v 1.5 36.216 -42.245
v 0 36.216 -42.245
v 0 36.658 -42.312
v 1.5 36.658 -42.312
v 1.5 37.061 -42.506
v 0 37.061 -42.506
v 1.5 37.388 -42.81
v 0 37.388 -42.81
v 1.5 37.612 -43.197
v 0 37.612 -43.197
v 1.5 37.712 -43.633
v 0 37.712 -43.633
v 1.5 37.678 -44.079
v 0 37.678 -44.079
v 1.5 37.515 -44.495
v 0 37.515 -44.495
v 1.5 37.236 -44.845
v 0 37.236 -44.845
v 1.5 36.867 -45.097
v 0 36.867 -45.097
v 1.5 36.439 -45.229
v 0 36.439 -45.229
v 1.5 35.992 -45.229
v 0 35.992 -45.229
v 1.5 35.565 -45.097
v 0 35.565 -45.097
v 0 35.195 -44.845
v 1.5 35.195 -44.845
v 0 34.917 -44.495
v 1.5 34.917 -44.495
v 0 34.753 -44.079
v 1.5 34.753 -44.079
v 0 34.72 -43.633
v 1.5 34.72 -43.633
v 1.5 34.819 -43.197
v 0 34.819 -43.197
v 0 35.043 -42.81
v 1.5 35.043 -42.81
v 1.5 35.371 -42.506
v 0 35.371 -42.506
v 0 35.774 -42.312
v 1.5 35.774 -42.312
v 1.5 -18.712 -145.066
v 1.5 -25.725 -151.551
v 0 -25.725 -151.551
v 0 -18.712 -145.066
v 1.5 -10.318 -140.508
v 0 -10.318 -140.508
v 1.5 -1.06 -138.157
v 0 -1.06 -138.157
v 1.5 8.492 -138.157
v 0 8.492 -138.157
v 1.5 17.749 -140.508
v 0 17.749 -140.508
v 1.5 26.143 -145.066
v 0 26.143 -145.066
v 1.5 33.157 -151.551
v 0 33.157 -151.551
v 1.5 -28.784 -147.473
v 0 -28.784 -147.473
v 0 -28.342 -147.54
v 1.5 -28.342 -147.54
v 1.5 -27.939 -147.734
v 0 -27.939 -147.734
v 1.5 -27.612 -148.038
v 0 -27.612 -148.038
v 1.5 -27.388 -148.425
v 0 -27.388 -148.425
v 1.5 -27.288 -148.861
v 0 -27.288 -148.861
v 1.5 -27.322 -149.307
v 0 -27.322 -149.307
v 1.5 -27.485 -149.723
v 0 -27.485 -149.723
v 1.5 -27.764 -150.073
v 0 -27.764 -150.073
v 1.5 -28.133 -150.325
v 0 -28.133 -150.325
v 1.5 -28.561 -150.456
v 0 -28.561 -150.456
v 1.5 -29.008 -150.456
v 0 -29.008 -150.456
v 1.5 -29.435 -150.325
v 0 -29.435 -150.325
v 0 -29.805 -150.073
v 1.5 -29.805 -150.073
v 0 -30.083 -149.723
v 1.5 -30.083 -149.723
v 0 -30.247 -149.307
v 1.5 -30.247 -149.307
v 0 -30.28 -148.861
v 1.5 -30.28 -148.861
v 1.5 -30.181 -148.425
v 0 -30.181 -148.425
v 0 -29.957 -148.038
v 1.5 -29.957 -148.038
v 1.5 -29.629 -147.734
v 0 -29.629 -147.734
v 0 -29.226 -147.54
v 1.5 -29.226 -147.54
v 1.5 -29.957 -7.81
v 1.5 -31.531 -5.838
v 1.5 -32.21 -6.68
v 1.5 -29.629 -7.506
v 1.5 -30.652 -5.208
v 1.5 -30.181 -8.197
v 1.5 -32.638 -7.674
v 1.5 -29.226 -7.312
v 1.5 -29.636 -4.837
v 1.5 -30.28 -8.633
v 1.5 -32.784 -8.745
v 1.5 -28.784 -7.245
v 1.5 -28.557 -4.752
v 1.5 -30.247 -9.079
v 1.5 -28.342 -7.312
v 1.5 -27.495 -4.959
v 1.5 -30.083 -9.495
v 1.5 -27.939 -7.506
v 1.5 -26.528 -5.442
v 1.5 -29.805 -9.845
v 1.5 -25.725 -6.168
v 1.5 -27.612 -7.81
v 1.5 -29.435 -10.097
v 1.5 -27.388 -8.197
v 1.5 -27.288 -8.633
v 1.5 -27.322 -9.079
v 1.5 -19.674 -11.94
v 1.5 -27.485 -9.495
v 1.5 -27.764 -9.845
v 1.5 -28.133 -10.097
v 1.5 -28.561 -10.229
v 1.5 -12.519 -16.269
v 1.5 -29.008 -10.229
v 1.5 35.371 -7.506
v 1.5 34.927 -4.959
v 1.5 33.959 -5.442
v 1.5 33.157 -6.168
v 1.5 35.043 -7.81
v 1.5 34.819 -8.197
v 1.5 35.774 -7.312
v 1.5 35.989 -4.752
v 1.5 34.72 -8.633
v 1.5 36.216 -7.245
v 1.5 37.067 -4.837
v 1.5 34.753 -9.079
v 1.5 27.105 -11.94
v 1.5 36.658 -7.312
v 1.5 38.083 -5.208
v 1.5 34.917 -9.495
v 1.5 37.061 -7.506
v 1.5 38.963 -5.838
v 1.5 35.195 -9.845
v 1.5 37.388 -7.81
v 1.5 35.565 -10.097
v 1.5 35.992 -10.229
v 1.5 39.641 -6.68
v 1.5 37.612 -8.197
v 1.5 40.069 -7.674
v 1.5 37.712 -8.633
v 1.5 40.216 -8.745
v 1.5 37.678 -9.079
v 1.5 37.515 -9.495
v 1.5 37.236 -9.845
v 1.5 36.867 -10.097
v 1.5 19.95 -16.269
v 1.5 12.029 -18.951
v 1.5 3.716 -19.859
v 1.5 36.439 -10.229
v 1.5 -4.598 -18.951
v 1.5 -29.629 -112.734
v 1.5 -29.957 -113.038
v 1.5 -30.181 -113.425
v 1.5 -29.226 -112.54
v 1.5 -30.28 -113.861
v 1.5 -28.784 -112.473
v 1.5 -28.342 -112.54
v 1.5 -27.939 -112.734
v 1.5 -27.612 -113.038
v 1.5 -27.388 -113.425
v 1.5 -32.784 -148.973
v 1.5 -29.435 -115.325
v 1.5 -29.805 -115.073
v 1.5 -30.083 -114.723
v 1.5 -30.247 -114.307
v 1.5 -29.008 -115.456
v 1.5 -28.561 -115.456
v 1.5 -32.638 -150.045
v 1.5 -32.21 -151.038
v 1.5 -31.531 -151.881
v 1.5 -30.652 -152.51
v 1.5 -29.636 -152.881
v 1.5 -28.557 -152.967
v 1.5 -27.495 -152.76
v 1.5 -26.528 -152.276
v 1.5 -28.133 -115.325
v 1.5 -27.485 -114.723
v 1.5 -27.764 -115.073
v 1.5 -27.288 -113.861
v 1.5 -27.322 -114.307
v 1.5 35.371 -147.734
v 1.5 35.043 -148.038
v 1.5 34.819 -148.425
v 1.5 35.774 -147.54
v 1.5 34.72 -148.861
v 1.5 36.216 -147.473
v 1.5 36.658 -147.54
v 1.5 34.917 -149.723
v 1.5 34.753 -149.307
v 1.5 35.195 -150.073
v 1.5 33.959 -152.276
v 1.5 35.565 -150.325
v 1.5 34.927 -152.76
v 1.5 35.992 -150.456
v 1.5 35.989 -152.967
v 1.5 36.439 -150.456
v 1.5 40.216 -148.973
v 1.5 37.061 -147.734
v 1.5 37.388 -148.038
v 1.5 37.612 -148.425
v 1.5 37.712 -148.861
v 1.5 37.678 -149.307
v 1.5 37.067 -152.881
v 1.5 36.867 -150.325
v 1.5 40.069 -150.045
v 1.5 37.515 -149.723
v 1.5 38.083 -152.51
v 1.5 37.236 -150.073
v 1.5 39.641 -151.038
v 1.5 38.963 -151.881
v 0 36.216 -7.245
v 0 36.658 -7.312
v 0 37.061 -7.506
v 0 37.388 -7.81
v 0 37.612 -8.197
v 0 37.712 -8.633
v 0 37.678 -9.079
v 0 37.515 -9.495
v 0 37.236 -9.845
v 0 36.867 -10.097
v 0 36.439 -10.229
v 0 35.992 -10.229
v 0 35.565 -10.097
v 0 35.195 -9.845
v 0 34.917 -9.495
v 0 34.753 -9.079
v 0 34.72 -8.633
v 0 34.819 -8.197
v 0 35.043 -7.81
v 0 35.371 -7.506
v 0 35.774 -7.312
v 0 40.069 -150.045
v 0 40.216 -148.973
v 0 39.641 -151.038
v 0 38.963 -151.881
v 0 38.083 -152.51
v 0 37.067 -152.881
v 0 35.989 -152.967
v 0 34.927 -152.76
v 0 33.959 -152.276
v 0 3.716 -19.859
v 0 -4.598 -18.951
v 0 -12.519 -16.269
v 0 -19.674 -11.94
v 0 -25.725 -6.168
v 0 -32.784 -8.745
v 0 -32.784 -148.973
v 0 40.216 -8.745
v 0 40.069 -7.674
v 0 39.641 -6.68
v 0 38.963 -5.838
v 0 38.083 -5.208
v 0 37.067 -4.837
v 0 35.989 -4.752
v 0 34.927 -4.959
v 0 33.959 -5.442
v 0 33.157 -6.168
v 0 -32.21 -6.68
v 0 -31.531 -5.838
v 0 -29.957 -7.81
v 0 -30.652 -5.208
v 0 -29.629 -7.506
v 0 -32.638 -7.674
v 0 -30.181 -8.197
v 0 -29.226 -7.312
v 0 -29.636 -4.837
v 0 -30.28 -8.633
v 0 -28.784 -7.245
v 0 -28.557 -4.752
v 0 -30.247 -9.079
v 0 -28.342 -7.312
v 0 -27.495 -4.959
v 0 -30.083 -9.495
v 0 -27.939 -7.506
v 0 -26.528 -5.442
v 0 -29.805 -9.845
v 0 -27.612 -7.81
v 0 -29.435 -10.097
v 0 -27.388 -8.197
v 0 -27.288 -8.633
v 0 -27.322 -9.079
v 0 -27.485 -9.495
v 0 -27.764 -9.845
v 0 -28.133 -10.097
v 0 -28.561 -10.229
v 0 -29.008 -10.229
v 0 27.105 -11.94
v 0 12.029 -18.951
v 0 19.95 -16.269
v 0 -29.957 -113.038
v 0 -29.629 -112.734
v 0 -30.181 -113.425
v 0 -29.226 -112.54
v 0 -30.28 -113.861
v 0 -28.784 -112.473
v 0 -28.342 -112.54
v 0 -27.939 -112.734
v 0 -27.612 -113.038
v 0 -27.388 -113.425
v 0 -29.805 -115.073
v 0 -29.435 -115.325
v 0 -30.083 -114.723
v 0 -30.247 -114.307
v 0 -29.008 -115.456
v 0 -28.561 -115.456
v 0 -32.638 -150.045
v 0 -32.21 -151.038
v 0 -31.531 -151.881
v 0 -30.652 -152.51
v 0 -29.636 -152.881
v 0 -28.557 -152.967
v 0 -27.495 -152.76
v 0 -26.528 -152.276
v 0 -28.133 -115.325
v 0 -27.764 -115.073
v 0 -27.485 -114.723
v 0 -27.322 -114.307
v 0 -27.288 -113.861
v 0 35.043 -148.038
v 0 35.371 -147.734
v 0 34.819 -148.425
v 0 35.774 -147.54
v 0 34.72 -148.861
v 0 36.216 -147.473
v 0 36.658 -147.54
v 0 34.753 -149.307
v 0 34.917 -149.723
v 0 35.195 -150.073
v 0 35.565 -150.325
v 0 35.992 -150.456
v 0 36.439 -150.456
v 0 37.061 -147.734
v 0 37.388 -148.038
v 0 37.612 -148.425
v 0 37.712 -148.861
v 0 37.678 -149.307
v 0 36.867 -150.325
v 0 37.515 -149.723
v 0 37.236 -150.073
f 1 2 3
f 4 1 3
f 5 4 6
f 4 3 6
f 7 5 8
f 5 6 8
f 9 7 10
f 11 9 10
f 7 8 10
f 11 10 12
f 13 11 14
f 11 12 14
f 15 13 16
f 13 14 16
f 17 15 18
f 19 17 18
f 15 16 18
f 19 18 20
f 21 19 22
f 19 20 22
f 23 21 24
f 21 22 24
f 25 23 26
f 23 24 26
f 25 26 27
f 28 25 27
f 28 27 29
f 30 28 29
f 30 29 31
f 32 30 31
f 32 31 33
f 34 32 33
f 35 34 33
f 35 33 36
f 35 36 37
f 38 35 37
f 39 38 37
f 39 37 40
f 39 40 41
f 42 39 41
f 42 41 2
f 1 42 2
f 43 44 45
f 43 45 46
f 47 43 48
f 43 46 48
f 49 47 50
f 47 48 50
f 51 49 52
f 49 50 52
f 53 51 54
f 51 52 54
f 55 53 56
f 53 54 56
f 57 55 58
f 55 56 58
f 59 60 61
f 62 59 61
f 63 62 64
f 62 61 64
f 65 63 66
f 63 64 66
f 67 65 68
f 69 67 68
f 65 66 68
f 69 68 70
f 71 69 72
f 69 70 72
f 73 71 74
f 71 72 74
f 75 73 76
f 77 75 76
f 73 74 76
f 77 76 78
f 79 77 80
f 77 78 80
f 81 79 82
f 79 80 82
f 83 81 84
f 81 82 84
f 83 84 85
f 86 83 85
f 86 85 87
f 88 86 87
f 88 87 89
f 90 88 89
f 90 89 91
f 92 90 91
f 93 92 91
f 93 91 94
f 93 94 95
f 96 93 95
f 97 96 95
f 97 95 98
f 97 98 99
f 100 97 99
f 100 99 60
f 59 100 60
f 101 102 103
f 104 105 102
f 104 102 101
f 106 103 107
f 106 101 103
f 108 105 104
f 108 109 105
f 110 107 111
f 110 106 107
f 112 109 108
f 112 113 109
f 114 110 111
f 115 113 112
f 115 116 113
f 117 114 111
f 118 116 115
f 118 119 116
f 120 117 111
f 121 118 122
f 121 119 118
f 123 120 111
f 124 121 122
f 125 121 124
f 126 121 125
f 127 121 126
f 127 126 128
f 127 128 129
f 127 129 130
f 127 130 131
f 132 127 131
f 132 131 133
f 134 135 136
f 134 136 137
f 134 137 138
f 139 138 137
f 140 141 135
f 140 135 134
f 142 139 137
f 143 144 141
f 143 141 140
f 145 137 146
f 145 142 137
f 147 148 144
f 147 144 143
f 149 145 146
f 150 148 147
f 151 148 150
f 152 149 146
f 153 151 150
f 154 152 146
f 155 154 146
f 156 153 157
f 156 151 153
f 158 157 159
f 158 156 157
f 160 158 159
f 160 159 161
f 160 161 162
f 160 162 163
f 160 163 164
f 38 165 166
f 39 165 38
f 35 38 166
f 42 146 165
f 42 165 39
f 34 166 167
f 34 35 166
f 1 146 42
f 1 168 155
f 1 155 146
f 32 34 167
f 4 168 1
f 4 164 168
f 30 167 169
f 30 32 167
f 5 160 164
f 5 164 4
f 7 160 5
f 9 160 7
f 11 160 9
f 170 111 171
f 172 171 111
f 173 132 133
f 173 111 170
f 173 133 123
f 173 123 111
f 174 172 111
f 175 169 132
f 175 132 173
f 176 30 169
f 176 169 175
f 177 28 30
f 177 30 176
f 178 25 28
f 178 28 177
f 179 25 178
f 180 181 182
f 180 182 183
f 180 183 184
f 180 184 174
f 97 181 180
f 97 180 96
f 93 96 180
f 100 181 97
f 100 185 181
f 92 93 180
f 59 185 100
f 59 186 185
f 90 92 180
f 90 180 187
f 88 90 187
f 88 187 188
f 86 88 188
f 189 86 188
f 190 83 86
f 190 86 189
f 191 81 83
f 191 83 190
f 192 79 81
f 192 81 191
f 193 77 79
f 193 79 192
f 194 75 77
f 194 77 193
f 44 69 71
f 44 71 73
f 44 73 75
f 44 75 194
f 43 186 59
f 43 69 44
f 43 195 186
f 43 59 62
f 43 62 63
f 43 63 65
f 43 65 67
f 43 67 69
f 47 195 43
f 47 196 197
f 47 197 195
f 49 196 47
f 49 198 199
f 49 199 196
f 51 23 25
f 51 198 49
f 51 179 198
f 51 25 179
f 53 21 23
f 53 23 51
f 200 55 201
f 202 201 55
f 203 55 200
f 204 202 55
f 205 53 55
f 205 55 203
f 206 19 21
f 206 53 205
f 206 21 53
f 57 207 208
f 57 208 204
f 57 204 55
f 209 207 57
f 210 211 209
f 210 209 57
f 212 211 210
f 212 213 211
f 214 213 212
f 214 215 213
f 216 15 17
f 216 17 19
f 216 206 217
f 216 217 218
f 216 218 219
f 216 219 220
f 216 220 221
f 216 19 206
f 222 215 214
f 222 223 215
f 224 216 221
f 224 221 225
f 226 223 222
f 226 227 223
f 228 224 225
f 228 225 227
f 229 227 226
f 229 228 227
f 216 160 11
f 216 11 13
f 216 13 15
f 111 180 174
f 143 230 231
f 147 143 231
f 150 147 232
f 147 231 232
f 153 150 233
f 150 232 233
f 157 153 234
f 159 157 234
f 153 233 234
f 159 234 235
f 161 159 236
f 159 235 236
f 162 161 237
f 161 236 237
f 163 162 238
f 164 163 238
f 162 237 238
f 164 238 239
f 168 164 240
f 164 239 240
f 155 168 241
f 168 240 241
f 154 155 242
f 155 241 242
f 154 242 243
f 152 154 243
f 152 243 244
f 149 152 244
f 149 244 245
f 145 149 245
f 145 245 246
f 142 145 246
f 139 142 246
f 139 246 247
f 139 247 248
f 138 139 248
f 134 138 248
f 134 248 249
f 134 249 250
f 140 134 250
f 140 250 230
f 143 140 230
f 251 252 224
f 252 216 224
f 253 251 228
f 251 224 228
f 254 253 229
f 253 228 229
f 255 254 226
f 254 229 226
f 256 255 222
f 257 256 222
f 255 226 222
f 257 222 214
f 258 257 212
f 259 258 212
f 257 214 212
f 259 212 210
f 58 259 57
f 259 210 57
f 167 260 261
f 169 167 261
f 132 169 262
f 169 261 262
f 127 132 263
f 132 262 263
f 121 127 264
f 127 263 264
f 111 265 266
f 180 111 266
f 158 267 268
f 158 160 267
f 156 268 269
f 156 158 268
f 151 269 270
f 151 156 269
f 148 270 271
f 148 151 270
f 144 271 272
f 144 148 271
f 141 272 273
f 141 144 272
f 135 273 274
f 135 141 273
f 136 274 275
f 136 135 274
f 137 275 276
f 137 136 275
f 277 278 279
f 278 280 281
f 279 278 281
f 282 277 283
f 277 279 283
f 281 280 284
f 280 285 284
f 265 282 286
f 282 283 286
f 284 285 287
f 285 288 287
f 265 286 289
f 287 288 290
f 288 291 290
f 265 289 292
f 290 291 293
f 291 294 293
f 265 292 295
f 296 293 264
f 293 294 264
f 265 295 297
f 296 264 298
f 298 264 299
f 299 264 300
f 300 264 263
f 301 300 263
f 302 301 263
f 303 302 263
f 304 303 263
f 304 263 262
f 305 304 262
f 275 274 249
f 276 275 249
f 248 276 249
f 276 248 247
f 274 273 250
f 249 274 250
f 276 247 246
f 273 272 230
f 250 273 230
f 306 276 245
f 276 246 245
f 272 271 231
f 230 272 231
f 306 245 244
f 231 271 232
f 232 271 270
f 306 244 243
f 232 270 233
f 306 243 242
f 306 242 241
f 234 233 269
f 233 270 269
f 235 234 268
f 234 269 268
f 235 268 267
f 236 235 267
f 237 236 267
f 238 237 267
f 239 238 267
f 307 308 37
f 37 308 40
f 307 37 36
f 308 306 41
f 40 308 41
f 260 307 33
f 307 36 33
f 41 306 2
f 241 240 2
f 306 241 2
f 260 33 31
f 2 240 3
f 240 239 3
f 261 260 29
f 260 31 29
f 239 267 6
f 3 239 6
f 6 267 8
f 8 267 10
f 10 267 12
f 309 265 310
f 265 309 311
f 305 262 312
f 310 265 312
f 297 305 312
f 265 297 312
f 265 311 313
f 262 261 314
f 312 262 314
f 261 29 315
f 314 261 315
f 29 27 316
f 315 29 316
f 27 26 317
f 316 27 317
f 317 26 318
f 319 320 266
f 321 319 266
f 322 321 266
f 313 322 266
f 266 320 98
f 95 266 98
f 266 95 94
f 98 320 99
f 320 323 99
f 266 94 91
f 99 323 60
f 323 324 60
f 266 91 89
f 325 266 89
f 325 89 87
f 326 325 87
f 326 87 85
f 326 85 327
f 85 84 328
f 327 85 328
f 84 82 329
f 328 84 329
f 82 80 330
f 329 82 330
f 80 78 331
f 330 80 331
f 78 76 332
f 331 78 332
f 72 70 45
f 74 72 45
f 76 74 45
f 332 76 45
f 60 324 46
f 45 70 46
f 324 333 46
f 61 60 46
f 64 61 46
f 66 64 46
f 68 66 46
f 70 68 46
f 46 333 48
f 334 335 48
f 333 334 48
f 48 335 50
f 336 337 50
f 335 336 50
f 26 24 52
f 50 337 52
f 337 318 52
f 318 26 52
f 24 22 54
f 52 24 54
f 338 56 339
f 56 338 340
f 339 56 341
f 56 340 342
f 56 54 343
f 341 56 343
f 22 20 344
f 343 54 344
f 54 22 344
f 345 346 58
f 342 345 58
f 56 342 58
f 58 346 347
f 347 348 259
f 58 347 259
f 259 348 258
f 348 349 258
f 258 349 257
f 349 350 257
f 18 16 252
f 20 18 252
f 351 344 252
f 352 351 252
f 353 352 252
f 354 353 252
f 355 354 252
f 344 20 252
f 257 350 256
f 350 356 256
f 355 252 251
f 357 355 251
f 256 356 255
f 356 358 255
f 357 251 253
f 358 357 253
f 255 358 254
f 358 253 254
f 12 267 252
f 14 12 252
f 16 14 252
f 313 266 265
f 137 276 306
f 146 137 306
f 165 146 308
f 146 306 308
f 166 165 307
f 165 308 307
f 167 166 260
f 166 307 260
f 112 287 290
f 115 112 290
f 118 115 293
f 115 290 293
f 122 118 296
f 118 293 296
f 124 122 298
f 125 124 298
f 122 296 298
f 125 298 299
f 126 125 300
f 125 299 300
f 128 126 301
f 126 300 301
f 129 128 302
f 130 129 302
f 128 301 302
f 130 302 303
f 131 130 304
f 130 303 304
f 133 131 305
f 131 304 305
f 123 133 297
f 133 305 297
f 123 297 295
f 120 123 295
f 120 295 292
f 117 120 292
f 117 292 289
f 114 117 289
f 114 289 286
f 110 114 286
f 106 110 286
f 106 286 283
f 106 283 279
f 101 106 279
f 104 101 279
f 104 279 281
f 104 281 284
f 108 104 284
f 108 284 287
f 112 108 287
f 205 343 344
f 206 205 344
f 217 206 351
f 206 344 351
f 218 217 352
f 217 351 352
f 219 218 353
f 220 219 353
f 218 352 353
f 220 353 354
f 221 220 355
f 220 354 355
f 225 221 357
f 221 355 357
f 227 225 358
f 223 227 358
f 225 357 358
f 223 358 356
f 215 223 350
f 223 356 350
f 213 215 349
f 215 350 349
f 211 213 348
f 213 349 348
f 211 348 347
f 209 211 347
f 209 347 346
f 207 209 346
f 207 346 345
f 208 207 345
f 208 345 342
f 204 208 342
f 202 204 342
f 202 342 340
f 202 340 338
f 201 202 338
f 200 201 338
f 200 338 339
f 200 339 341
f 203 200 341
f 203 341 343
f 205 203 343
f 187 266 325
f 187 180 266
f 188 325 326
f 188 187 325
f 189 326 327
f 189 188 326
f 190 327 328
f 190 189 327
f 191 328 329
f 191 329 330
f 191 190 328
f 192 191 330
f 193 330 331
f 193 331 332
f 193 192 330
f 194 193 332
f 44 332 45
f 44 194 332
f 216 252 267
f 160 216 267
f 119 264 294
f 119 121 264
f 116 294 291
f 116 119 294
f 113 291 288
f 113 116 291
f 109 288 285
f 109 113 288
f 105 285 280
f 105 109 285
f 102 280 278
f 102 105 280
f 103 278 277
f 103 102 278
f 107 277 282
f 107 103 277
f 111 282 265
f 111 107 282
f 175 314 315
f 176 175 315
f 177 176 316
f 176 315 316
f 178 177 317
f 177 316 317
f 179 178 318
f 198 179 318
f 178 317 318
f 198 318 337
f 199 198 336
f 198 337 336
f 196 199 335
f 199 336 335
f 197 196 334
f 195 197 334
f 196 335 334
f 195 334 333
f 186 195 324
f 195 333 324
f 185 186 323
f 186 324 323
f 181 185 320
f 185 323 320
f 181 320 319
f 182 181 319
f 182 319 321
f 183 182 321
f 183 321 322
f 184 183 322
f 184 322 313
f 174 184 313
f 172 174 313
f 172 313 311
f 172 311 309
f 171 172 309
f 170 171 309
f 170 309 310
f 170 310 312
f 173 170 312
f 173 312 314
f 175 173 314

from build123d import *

# Parameters (mm, degrees)
BOSS_EXTRUDE1_DEPTH       = 1.5
FILLET1_R                 = 4
F_3_0MM_DOWEL_HOLE2_D     = 3
F_3_0MM_DOWEL_HOLE2_DEPTH = 17.29
F_3_0MM_DOWEL_HOLE2_TIP   = 0.901290929


with BuildPart() as part:
    # Sketch1 → Boss-Extrude1 (new body)
    with BuildSketch(Plane(origin=(0, 0, 0), x_dir=(0, 0, -1), z_dir=(1, 0, 0))):
        with BuildLine():
            Line((164.111754286, 40.215722327), (-6.393348286, 40.215722327))
            ThreePointArc((-6.393348286, 40.215722327), (12.614416769, 26.195971709), (19.859203, 3.715722327))
            ThreePointArc((19.859203, 3.715722327), (12.614416769, -18.764527055), (-6.393348286, -32.784277673))
            Line((-6.393348286, -32.784277673), (164.111754286, -32.784277673))
            ThreePointArc((164.111754286, -32.784277673), (137.859203, 3.715722327), (164.111754286, 40.215722327))
        make_face()
    extrude(amount=BOSS_EXTRUDE1_DEPTH)

    # Fillet1
    fillet1_edges = [part.edges().sort_by_distance(p)[0] for p in [
        (0.75, -32.784277673, -164.111754286),
        (0.75, -32.784277673, 6.393348286),
        (0.75, 40.215722327, 6.393348286),
        (0.75, 40.215722327, -164.111754286),
    ]]
    fillet(fillet1_edges, radius=FILLET1_R)

    # Ø3.0mm Dowel Hole2
    with Locations(Plane(origin=(1.5, 0, 0), x_dir=(0, 0, -1), z_dir=(1, 0, 0))):
        with Locations((8.745330875, 36.215722327), (148.973075124, 36.215722327), (148.973075124, -28.784277673), (8.745330875, -28.784277673), (43.745330875, 36.215722327), (113.973075124, -28.784277673)):
            Hole(F_3_0MM_DOWEL_HOLE2_D / 2, depth=F_3_0MM_DOWEL_HOLE2_DEPTH)
            with Locations((0, 0, -(F_3_0MM_DOWEL_HOLE2_DEPTH + F_3_0MM_DOWEL_HOLE2_TIP / 2))):  # 118° drill point
                Cone(0, F_3_0MM_DOWEL_HOLE2_D / 2, F_3_0MM_DOWEL_HOLE2_TIP, mode=Mode.SUBTRACT)


solid = part.part
